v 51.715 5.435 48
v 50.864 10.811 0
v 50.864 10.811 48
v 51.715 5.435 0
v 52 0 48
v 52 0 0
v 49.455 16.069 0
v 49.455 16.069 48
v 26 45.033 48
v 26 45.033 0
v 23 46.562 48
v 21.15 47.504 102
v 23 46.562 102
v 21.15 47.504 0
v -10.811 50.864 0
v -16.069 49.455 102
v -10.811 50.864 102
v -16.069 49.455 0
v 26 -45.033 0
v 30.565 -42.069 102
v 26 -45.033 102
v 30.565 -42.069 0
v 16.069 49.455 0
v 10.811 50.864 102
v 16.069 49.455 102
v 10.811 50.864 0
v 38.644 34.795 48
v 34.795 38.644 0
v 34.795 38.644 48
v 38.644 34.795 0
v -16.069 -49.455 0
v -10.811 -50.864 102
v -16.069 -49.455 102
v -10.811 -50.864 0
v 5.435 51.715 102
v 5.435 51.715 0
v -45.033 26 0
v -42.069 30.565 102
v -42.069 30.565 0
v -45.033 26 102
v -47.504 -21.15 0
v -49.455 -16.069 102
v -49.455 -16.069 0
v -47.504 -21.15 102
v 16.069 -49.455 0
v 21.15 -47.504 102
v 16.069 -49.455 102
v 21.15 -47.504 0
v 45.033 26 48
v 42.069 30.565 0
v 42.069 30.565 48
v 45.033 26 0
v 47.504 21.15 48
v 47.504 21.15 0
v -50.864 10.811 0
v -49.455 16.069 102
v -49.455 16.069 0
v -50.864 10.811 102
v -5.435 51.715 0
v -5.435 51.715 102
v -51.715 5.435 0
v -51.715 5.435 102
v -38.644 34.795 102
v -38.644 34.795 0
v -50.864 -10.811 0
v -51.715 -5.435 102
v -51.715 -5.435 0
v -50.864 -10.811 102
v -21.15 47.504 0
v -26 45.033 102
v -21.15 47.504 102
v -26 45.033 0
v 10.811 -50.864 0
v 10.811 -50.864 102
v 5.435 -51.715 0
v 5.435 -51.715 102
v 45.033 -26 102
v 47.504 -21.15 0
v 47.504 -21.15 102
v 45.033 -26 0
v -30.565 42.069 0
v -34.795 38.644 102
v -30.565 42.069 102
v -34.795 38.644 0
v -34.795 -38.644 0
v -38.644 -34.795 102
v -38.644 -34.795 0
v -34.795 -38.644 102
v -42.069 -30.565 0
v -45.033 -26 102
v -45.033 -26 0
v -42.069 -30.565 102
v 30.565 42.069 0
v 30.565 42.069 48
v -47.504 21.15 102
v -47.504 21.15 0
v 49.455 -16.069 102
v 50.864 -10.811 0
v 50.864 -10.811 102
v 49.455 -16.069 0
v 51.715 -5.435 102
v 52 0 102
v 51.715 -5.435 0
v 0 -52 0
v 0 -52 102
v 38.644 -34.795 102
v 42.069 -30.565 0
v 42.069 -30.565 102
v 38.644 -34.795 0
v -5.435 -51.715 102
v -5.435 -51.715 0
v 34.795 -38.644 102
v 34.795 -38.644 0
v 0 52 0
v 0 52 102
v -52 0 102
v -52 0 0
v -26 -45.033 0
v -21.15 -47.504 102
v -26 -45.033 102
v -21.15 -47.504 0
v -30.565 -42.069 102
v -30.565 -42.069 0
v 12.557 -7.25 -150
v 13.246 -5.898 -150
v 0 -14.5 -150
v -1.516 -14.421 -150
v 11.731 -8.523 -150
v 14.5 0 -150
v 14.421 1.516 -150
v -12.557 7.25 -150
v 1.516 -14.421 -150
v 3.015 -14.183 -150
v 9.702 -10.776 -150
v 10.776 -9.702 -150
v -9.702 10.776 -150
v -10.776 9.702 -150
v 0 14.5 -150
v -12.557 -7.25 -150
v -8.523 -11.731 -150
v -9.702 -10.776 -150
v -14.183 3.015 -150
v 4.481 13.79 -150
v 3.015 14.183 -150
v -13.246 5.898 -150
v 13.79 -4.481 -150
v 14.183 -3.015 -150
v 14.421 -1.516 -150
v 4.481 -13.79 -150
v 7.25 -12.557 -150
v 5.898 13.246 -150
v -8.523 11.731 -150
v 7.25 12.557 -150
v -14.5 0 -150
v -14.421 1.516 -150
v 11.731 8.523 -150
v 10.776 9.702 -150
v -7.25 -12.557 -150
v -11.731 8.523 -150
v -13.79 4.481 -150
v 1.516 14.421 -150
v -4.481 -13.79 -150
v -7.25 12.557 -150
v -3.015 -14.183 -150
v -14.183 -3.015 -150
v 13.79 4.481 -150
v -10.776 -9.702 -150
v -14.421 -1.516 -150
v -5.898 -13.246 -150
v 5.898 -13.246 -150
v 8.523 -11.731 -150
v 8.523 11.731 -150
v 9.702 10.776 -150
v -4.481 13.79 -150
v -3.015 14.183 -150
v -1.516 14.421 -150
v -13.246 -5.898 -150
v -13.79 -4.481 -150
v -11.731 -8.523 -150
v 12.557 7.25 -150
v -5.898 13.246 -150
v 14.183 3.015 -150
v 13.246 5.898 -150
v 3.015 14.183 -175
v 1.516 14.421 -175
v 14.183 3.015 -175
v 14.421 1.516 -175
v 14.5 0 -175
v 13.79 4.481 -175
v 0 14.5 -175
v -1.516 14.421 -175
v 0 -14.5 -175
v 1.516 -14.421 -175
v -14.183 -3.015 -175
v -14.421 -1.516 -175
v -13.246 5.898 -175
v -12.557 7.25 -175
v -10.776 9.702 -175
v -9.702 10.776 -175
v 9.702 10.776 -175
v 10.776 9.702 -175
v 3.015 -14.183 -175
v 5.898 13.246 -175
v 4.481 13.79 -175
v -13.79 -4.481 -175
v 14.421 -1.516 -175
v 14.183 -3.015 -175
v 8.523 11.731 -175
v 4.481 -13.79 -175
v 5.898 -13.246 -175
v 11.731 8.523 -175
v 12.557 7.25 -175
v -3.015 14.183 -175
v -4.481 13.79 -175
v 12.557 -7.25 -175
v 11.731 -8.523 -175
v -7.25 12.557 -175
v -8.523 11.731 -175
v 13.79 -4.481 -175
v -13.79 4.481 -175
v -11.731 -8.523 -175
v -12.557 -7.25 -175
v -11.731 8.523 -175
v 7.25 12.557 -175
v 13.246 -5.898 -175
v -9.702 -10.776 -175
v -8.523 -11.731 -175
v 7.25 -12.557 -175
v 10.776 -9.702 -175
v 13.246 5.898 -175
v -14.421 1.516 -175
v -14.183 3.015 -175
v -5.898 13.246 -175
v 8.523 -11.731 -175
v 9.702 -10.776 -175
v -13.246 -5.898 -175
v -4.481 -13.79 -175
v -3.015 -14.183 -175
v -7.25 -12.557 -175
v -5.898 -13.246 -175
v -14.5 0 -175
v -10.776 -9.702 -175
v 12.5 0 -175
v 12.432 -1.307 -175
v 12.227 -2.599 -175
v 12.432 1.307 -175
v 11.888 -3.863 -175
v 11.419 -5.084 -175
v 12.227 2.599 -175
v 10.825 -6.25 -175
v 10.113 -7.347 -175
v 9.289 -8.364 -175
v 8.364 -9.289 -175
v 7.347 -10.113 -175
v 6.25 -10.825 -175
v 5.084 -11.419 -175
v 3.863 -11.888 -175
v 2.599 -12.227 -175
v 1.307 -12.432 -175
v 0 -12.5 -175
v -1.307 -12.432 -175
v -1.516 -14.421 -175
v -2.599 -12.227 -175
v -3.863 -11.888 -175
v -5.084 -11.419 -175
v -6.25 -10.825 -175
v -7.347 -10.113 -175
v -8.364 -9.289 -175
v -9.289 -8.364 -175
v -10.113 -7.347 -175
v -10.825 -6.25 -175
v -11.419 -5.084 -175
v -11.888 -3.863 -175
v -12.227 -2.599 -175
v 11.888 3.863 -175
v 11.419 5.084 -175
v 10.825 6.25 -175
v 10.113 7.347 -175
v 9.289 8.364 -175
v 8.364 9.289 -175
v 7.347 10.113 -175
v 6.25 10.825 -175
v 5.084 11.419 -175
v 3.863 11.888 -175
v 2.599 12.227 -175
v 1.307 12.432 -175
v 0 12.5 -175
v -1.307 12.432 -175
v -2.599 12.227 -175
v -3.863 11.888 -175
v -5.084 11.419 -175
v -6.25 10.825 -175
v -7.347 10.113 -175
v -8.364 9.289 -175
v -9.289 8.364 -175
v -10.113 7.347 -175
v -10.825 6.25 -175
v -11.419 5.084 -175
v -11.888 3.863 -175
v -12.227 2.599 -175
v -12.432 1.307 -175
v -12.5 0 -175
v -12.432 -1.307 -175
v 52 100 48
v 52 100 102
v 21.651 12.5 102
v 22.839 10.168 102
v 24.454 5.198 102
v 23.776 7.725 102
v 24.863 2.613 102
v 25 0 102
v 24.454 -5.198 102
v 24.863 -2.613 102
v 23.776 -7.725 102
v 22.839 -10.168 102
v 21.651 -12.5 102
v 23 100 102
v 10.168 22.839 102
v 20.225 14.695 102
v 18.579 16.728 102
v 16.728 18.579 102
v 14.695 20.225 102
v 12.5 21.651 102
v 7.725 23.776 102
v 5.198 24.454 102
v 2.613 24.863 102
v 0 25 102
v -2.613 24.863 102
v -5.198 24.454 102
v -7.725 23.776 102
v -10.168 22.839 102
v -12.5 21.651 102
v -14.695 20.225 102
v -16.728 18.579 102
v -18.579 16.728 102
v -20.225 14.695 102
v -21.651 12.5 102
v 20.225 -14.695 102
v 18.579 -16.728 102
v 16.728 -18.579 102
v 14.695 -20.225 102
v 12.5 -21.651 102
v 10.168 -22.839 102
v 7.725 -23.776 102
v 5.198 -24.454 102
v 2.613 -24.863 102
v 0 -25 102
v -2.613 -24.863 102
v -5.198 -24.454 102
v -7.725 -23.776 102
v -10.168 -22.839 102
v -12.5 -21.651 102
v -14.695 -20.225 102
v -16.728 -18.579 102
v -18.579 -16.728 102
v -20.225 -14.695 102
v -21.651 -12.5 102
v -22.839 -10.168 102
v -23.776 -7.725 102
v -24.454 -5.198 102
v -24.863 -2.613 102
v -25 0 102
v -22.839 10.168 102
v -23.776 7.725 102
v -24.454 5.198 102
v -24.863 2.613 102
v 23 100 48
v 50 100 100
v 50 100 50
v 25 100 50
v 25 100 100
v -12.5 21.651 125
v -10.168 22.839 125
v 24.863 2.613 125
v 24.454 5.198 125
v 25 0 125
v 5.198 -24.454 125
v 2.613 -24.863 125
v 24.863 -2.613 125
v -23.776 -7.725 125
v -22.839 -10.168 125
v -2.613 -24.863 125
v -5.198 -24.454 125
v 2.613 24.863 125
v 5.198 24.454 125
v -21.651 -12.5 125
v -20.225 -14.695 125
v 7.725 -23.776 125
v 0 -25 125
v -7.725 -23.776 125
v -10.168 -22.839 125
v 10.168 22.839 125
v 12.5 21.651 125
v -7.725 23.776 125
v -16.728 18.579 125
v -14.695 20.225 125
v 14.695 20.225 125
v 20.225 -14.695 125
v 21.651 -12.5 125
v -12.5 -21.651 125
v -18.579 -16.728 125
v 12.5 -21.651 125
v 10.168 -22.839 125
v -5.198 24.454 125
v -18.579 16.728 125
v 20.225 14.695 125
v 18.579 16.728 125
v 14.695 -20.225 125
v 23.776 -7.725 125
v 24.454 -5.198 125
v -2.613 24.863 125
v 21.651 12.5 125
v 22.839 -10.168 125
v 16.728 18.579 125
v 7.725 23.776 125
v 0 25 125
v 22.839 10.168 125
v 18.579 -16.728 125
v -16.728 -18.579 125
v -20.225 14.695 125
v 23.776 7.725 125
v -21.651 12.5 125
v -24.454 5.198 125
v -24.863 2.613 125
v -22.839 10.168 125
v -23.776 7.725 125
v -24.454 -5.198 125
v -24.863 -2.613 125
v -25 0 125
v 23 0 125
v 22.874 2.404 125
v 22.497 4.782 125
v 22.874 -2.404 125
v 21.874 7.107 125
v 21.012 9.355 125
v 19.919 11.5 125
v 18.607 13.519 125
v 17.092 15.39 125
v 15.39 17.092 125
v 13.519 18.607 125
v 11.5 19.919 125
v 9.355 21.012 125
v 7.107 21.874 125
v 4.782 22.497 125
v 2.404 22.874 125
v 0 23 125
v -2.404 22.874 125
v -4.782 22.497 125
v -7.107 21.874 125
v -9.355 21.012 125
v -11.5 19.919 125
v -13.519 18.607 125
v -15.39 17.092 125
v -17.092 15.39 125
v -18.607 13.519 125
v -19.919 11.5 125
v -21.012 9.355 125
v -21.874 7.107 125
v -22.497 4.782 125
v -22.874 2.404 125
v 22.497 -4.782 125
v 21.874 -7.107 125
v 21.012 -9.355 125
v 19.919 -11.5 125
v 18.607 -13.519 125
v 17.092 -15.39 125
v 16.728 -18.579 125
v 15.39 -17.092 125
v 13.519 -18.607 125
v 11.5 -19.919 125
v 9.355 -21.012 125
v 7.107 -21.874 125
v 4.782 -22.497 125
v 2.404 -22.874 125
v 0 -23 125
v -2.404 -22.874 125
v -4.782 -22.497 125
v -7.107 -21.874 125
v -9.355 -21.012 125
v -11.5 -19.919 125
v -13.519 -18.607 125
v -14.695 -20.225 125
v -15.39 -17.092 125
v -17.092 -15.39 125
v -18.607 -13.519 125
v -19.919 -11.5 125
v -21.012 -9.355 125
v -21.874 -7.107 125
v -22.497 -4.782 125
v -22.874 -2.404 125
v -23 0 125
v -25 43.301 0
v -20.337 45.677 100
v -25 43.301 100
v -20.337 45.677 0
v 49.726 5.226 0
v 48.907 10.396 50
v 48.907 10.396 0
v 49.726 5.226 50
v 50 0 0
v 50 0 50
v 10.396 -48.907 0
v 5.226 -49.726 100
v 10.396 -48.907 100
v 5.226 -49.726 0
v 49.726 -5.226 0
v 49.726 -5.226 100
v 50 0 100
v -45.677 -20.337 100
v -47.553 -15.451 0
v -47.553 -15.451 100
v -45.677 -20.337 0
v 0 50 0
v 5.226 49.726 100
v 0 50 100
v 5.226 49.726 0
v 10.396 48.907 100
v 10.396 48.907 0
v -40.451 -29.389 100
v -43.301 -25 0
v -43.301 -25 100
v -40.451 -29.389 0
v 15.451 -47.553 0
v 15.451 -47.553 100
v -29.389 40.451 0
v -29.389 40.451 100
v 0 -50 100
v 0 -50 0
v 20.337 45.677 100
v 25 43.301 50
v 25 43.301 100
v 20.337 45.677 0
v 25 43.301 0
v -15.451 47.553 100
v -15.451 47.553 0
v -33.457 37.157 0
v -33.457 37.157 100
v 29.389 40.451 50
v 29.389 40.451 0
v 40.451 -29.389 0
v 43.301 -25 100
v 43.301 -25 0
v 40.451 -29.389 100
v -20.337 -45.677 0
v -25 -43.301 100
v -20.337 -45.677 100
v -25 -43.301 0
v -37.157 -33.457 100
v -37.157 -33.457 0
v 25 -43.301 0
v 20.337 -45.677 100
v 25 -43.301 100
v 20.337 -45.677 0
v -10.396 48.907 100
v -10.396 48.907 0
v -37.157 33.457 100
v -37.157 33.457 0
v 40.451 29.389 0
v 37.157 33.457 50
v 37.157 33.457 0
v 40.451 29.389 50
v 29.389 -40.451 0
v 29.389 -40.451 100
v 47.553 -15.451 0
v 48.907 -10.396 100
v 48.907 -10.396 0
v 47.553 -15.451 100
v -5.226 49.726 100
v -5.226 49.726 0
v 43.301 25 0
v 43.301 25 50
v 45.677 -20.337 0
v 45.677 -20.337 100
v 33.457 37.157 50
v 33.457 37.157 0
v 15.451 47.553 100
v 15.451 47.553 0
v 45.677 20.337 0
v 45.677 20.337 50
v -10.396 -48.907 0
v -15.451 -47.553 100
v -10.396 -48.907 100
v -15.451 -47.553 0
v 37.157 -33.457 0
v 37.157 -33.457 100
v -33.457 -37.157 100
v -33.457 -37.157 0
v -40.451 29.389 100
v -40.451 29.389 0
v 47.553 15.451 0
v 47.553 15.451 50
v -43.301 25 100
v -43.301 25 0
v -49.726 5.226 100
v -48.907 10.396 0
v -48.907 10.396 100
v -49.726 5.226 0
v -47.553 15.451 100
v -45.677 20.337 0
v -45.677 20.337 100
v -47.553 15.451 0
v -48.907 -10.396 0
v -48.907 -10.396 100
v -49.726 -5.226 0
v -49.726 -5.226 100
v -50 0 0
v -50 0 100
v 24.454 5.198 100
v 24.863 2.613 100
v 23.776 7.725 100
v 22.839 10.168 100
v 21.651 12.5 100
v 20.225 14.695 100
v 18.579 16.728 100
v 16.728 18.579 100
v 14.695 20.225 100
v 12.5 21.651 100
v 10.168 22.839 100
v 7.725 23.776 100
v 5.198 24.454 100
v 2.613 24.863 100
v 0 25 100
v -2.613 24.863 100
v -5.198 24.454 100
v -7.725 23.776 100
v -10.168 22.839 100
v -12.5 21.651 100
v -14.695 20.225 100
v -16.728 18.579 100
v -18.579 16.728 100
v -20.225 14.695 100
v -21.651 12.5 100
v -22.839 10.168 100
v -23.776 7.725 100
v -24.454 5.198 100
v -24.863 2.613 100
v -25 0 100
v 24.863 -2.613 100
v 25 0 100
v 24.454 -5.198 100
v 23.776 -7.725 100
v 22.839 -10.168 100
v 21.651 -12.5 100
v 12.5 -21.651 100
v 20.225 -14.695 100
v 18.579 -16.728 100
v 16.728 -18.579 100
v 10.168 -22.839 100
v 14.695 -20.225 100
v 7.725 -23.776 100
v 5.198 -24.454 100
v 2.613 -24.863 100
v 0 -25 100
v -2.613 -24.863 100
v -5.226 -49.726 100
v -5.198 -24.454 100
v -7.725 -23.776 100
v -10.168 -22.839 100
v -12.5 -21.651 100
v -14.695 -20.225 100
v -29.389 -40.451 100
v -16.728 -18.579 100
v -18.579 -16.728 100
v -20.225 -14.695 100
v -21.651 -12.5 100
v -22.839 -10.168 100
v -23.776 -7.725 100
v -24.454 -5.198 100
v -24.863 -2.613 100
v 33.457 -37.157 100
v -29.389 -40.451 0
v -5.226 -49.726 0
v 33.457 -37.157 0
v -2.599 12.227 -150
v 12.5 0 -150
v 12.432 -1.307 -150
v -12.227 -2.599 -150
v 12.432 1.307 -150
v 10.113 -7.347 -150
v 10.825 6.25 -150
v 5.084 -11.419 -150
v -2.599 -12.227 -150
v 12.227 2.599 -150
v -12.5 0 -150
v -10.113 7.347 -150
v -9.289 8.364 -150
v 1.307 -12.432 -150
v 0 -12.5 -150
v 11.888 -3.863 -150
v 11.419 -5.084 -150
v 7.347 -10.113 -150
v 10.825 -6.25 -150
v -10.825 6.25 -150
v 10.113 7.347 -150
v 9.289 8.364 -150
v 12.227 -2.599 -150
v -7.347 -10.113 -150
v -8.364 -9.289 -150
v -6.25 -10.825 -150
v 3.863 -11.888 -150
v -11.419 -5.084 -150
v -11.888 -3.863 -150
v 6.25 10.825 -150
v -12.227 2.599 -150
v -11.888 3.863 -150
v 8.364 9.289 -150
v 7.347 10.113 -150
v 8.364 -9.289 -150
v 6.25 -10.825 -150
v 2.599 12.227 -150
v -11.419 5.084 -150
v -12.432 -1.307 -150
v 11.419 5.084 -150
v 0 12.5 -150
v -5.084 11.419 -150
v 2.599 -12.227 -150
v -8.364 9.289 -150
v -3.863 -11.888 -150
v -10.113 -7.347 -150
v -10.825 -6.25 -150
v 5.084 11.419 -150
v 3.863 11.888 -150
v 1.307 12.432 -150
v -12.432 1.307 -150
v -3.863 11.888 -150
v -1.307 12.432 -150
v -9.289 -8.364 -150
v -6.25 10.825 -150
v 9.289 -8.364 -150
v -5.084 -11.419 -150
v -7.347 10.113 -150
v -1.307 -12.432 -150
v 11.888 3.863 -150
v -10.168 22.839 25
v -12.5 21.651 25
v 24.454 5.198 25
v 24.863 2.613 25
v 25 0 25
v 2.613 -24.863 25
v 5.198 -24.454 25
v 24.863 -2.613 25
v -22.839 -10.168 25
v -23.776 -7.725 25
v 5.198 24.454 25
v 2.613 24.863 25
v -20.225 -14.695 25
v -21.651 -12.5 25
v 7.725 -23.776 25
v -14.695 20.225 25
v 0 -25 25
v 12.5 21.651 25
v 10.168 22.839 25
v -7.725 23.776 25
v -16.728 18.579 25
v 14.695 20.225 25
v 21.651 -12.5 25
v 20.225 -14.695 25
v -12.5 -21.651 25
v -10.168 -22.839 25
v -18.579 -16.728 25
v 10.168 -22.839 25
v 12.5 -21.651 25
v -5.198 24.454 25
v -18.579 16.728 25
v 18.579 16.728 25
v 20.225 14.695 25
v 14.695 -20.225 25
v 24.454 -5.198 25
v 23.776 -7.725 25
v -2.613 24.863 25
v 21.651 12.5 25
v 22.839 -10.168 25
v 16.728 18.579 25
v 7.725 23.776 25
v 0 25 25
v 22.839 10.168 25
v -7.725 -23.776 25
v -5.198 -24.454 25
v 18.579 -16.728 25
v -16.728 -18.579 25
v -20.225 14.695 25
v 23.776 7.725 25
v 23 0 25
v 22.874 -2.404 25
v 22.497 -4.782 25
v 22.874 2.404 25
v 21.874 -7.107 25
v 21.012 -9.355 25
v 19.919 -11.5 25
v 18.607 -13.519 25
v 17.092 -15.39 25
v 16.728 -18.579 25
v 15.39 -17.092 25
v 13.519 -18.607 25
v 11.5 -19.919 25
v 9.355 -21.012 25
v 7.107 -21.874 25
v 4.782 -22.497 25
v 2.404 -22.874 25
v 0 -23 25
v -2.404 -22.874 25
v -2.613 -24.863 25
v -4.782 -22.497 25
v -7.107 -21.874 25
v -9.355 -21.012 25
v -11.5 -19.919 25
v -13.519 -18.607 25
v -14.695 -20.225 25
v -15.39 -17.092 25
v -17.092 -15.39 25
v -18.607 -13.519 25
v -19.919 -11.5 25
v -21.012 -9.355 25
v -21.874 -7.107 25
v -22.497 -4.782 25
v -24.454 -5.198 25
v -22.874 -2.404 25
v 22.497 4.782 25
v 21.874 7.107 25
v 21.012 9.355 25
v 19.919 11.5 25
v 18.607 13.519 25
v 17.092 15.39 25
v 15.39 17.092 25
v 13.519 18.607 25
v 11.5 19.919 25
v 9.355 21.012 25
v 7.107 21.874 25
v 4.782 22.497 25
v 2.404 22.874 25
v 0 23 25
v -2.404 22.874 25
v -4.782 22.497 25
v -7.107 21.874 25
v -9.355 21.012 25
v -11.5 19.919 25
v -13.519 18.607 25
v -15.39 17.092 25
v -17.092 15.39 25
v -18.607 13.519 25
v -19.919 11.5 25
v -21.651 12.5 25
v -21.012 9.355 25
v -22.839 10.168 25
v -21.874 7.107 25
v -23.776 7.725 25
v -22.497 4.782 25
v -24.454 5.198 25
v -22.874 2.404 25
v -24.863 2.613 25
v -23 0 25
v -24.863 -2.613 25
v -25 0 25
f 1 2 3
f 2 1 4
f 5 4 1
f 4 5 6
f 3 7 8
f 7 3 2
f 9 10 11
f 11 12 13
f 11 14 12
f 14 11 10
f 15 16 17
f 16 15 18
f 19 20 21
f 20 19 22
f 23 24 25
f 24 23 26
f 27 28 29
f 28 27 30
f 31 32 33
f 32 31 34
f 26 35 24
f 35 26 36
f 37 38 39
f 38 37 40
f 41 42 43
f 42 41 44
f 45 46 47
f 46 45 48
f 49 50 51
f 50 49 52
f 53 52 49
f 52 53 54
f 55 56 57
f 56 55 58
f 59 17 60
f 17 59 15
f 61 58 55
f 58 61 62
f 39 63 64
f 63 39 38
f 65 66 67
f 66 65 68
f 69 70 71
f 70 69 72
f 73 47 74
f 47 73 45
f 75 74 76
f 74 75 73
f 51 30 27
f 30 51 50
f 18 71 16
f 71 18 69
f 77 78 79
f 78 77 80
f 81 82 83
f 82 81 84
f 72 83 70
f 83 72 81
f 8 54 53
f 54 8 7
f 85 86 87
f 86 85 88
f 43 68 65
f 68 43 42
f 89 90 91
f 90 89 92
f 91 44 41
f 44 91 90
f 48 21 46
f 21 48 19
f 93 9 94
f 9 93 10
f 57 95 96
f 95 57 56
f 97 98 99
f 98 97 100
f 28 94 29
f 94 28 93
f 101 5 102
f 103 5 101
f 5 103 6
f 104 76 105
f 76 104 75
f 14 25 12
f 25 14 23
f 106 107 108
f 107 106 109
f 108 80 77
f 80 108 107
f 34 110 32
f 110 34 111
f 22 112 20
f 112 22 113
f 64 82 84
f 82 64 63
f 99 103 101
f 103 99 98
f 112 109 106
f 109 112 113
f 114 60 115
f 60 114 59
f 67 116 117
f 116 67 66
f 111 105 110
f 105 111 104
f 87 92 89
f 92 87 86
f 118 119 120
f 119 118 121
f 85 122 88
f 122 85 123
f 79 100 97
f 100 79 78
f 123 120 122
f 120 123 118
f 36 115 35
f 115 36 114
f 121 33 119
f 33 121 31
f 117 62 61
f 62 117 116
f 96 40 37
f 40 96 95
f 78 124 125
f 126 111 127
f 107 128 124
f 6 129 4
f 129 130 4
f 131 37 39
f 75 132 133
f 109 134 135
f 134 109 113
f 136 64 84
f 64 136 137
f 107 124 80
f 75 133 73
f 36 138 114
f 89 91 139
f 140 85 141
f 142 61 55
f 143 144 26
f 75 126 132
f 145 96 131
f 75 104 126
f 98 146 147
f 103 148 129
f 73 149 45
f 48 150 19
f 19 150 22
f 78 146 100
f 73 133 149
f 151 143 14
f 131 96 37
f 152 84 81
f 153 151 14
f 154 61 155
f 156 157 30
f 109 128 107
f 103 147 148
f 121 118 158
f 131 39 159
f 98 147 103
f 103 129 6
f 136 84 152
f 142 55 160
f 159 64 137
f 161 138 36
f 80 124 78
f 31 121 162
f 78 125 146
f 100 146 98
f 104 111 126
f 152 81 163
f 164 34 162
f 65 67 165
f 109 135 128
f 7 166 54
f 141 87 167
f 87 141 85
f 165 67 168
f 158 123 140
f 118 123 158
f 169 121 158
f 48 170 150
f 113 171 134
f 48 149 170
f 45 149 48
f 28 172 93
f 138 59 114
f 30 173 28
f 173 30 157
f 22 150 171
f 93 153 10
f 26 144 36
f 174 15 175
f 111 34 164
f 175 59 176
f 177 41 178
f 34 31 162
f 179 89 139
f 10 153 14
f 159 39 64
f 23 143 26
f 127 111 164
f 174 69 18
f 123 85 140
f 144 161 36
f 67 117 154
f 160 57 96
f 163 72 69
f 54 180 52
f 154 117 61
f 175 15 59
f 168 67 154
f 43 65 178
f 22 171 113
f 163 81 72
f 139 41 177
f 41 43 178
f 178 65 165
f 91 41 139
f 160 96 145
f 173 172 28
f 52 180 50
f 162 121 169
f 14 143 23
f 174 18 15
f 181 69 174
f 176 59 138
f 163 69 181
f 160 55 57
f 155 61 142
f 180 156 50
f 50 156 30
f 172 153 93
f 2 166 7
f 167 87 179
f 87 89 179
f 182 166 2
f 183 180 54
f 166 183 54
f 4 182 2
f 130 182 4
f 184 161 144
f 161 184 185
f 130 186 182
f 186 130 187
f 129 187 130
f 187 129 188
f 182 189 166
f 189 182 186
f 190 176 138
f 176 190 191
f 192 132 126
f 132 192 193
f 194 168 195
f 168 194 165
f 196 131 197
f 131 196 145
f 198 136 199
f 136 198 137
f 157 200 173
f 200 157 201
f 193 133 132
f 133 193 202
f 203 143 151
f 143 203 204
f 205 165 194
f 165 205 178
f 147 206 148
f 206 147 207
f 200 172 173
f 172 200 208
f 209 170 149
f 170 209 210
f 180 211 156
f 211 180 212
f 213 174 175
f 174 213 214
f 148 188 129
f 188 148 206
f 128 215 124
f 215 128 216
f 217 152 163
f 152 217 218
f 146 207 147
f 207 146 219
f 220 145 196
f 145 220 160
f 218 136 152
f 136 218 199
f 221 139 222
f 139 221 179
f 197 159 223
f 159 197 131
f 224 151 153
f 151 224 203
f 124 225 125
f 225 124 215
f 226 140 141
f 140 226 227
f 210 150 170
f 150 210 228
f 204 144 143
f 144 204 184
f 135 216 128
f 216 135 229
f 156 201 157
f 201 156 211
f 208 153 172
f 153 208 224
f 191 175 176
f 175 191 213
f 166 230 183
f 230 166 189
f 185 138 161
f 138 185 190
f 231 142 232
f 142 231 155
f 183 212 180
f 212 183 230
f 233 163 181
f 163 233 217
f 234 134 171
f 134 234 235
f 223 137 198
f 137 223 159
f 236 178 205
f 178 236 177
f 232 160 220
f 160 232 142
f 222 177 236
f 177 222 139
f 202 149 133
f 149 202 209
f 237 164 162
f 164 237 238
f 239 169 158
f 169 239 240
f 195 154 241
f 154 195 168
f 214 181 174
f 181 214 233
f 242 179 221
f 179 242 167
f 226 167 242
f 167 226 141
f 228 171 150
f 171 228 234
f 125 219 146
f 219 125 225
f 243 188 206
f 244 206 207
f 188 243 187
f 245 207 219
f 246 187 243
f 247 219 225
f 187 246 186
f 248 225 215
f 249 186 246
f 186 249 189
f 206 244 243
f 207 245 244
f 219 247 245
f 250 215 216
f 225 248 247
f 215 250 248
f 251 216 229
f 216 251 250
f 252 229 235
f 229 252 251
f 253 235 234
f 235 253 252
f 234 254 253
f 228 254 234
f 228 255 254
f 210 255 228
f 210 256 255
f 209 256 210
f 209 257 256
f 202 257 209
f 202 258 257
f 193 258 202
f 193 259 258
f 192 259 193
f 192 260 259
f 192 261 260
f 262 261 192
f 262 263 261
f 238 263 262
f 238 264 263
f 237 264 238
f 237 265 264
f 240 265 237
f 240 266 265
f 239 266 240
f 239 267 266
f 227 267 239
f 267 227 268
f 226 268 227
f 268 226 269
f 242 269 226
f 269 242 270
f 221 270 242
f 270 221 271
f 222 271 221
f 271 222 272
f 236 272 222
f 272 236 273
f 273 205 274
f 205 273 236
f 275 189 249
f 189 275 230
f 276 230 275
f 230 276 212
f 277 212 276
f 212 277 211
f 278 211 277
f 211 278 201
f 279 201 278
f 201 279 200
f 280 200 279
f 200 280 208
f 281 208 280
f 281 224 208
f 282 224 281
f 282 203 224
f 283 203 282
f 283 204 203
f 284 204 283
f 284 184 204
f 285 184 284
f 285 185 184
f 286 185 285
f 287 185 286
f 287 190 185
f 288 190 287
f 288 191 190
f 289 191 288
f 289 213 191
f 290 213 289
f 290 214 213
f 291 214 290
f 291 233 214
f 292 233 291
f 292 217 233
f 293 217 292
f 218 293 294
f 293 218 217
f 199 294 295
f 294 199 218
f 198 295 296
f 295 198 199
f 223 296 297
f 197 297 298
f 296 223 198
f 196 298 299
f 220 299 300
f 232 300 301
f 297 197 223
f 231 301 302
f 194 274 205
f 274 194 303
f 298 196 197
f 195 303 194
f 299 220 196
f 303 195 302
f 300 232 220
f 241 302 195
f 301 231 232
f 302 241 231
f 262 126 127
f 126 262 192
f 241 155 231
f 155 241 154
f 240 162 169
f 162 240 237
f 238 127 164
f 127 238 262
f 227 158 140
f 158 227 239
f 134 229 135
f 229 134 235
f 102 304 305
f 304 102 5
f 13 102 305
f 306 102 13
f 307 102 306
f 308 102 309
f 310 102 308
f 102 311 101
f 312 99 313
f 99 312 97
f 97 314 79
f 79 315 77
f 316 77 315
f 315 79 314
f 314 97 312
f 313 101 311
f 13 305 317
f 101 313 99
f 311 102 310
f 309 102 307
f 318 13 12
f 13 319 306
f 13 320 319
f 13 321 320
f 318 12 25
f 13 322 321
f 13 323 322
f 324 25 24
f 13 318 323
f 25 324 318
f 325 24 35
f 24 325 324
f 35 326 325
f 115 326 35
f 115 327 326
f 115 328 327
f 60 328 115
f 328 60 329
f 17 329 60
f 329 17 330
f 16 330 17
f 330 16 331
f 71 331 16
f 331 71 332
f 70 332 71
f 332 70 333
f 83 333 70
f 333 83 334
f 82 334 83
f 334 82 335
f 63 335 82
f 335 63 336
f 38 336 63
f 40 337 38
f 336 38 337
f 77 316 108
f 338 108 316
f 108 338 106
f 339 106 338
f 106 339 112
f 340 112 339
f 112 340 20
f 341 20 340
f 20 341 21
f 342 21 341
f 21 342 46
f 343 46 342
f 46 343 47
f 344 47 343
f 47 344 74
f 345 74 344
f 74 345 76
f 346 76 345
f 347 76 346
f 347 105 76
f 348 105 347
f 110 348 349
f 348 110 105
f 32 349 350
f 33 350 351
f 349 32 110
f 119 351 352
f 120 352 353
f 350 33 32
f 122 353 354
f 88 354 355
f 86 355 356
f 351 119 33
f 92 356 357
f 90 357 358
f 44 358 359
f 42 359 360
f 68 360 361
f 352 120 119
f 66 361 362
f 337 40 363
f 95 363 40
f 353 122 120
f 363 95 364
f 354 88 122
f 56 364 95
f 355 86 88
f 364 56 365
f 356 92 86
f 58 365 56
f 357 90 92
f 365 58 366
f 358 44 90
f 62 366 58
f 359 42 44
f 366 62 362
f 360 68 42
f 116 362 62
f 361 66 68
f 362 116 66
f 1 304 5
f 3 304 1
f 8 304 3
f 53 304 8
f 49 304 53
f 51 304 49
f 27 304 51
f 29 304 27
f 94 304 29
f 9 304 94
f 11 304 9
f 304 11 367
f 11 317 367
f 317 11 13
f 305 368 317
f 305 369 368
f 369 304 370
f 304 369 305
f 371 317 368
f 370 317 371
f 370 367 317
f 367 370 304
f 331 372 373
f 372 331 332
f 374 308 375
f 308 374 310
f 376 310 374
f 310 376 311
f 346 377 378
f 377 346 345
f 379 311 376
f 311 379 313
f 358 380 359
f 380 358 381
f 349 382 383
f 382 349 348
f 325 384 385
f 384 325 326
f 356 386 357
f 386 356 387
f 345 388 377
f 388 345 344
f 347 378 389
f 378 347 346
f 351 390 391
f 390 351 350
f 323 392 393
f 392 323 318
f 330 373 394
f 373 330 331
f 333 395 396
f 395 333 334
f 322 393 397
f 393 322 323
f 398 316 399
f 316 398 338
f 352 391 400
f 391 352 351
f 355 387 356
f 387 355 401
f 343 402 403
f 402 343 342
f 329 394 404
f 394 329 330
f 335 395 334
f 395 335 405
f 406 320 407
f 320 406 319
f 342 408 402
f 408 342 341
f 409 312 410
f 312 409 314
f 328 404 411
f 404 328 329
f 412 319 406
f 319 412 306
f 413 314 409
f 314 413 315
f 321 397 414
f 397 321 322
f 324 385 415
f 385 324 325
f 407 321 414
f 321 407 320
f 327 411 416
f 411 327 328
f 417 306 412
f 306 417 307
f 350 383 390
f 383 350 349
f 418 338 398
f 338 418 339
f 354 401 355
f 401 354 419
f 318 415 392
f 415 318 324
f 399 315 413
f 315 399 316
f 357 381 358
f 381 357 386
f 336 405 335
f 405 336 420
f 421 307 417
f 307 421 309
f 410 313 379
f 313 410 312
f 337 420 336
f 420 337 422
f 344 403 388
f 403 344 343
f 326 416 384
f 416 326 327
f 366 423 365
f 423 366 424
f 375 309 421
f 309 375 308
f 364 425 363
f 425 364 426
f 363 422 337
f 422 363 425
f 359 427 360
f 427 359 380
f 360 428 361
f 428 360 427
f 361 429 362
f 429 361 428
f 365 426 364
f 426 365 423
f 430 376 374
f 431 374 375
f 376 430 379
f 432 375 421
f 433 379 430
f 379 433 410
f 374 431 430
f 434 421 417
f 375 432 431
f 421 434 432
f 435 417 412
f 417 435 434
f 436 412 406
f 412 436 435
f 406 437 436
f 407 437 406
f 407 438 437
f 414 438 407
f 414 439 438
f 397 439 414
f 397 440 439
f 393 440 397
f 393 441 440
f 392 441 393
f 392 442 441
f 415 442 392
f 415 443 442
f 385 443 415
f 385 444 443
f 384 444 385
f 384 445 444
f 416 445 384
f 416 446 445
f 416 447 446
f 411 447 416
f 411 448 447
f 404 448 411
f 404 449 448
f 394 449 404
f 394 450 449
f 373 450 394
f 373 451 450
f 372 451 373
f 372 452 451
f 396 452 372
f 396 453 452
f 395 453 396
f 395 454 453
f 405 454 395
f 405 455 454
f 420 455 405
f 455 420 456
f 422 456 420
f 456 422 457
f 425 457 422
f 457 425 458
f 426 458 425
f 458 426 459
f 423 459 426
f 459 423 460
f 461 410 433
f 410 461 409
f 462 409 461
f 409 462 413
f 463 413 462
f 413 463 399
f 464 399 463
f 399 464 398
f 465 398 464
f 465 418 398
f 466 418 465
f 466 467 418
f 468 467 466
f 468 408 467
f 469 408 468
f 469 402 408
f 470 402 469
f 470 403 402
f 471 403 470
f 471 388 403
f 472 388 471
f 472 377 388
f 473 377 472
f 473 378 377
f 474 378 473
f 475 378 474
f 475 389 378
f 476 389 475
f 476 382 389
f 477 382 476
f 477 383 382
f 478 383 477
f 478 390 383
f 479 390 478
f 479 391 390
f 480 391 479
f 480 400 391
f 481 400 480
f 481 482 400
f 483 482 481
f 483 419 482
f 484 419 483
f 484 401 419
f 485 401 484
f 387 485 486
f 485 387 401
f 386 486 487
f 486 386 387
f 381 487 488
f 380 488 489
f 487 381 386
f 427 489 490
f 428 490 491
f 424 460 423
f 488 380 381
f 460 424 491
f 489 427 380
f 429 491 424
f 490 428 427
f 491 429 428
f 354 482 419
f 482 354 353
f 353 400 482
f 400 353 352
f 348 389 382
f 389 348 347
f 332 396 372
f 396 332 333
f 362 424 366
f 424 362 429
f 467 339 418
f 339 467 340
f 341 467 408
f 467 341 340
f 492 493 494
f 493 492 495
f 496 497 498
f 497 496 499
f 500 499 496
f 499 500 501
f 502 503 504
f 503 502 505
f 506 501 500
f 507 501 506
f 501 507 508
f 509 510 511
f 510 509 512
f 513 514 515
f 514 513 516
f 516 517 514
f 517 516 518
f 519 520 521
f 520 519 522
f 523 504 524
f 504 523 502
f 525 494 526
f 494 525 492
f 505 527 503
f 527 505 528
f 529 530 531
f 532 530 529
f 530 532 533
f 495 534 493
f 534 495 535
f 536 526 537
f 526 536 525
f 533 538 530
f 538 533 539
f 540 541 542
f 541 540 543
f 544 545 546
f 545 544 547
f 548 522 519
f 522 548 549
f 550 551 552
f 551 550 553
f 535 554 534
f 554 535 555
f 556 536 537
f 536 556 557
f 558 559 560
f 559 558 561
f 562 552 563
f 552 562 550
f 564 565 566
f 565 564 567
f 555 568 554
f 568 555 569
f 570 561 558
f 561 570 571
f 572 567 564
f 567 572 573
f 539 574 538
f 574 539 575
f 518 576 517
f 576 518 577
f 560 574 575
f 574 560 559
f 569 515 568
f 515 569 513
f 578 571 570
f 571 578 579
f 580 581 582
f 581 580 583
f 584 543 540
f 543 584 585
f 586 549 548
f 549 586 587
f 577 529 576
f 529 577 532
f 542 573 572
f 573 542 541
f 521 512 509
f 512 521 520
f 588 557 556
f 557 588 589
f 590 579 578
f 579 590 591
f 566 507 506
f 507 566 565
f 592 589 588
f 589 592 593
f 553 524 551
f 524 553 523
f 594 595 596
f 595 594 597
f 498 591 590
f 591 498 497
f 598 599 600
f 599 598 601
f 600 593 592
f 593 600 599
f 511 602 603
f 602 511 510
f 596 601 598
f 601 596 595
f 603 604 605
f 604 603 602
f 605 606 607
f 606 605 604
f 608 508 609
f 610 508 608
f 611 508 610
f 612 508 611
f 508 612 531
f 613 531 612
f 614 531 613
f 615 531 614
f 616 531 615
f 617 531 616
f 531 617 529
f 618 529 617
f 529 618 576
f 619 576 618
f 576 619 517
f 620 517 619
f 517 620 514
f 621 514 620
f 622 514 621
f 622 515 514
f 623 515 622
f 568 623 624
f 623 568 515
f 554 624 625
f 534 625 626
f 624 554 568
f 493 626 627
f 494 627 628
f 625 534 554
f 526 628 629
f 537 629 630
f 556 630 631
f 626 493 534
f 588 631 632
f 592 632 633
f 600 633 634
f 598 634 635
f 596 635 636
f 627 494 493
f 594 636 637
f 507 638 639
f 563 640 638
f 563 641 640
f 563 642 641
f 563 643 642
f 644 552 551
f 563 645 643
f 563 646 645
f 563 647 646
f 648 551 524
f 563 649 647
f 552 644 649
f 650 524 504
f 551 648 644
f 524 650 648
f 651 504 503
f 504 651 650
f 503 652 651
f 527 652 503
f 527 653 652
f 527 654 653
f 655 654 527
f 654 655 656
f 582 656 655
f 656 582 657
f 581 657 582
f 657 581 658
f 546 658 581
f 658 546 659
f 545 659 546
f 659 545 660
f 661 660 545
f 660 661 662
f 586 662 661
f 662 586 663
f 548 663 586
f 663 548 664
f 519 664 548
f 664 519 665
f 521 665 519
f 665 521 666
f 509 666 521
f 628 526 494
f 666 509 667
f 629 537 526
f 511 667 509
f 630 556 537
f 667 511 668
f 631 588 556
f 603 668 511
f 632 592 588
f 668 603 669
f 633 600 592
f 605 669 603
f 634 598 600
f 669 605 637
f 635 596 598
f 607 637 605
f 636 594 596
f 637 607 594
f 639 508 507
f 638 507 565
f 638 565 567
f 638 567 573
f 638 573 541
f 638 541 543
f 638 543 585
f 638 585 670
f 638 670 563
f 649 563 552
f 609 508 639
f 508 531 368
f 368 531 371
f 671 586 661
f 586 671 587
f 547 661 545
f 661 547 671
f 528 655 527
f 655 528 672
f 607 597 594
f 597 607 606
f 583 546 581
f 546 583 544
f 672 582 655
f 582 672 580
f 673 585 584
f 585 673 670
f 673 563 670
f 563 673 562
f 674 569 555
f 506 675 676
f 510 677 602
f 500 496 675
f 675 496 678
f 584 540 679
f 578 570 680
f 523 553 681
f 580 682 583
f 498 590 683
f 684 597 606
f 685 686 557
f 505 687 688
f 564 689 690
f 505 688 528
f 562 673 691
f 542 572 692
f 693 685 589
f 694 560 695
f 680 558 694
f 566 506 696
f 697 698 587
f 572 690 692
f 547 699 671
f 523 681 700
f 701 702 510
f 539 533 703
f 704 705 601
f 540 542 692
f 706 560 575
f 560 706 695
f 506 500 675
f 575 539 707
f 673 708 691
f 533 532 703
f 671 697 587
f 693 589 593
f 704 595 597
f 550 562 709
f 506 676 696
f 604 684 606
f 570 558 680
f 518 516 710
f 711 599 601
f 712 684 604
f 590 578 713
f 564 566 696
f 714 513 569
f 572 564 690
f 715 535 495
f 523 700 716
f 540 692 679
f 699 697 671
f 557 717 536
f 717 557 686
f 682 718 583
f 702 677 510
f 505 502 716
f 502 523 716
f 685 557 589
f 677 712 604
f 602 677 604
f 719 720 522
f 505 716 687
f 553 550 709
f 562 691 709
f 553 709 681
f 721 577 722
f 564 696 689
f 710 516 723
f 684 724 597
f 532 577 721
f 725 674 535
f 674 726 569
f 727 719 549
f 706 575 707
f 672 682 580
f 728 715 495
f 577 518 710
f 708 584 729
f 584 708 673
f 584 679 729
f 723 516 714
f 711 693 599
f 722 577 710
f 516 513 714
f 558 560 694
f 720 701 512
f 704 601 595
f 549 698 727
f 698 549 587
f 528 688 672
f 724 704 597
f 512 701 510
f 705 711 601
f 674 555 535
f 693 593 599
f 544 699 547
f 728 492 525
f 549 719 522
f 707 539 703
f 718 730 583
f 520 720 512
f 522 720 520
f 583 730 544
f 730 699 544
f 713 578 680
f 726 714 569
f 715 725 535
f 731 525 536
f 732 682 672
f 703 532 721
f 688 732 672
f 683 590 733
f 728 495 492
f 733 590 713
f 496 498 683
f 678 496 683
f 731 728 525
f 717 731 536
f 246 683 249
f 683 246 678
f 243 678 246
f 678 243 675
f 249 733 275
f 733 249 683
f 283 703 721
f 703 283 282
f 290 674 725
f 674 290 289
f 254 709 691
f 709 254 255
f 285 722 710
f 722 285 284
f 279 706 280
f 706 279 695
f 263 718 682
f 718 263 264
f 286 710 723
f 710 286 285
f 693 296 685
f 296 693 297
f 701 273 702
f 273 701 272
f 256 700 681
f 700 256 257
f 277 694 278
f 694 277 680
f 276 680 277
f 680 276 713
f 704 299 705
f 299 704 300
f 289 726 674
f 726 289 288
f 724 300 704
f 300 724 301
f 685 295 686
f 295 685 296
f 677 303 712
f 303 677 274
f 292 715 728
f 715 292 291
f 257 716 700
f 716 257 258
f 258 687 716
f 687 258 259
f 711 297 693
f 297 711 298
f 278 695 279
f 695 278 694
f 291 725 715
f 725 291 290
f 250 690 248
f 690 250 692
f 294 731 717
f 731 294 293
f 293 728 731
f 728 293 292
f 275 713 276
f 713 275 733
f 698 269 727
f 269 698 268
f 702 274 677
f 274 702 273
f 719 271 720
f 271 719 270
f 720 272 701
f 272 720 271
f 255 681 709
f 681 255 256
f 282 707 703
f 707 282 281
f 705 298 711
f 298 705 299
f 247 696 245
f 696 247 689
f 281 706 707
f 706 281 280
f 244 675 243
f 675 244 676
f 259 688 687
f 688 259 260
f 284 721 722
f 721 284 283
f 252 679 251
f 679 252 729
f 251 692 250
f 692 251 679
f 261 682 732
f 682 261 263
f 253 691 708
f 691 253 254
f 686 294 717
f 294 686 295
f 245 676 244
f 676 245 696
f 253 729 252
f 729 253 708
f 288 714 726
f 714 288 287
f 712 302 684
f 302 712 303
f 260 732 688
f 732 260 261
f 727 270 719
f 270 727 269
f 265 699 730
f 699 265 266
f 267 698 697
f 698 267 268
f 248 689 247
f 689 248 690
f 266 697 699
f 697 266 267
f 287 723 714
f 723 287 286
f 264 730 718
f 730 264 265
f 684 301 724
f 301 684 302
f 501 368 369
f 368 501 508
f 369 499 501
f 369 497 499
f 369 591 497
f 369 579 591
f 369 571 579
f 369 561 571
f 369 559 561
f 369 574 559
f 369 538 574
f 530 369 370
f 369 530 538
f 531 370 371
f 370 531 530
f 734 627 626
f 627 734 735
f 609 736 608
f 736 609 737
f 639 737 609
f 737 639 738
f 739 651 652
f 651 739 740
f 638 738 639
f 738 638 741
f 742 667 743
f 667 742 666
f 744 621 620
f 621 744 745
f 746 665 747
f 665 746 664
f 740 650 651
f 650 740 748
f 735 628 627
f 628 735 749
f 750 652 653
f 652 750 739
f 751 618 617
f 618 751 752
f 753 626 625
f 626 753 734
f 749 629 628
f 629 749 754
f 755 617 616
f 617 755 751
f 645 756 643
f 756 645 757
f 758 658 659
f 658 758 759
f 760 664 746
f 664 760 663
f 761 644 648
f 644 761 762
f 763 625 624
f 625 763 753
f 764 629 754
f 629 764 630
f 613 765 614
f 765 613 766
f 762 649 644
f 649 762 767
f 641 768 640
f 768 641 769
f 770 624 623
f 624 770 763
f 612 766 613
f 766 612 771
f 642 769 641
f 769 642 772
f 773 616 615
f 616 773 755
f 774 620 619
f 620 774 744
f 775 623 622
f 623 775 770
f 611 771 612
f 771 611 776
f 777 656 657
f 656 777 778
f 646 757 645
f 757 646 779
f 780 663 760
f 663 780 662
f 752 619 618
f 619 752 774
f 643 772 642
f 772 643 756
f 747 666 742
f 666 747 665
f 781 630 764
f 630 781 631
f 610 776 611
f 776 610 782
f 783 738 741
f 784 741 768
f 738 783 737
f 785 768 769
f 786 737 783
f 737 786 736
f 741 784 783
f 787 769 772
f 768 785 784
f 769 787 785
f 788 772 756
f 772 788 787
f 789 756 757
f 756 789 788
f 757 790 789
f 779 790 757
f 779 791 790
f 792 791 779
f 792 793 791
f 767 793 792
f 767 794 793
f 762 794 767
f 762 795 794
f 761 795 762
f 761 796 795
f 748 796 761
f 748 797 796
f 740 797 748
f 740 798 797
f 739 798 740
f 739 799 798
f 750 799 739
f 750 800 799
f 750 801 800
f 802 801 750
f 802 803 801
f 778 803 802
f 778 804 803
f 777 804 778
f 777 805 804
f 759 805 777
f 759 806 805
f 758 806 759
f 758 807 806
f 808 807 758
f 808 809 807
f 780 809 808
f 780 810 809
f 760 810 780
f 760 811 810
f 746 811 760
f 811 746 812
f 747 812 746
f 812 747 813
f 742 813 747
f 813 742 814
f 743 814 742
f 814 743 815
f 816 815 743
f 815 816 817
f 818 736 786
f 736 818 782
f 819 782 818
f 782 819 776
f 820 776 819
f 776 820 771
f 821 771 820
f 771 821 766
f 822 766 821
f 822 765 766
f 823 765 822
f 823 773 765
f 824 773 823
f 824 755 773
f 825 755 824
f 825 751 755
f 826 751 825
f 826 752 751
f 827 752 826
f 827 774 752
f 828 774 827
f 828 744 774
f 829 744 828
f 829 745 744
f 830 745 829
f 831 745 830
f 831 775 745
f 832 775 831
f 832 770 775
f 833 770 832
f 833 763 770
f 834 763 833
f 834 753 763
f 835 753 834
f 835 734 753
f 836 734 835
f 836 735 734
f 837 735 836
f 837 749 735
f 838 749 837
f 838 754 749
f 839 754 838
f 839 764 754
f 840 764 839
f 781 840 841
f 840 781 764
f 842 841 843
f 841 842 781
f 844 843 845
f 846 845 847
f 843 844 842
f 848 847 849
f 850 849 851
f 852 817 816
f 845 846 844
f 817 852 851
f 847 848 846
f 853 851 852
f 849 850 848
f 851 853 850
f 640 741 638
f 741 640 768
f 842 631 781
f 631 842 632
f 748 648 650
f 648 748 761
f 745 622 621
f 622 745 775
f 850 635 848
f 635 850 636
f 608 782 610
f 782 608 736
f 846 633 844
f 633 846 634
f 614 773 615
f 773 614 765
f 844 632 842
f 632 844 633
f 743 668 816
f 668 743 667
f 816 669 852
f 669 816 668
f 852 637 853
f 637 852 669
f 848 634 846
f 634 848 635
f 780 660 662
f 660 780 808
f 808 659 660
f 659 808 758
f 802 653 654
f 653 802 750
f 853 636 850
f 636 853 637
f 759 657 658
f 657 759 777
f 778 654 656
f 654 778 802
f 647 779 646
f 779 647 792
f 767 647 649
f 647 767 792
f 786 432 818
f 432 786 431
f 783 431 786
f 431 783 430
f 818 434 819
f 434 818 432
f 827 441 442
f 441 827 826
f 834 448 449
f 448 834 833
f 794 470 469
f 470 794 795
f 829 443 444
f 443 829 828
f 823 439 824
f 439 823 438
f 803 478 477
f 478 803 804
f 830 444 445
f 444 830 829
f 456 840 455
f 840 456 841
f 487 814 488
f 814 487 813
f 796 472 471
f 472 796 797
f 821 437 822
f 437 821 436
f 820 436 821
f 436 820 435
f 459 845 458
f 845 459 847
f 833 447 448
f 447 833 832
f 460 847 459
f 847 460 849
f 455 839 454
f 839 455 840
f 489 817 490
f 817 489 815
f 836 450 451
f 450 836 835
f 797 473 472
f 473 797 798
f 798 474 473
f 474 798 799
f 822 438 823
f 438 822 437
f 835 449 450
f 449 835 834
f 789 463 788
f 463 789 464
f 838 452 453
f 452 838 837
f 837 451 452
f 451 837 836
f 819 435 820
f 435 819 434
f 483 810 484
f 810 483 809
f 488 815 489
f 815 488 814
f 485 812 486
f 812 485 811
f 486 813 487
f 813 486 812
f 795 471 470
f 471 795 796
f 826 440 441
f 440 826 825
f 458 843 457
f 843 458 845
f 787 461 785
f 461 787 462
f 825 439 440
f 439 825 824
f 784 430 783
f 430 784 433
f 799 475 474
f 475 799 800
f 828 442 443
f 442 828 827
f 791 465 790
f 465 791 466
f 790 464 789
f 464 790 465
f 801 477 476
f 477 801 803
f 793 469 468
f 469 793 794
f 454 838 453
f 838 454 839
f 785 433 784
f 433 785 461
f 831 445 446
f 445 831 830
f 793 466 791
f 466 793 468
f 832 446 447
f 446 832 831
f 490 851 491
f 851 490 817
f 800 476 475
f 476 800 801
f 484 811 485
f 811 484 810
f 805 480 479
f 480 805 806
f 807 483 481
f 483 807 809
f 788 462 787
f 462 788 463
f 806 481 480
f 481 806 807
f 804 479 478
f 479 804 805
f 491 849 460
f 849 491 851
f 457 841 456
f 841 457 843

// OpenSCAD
// =============================================================================
// --- Parametric Cyclone Filter ---
// =============================================================================
// OpenSCAD model for a traditional tangential cyclone separator.

// --- Parameters ---
// (Defaults; can be overridden via -D from command line)
cyclone_diameter = 100.0;
cylinder_height = 100.0;
cone_height = 150.0;
inlet_width = 25.0;
inlet_height = 50.0;
vortex_finder_diameter = 50.0;
vortex_finder_length = 75.0;
dust_outlet_diameter = 25.0;
wall_thickness = 2.0;

// High resolution for rendering
$fn = is_undef(high_res_fn) ? 60 : high_res_fn;

// Simulation flags
GENERATE_CFD_VOLUME = is_undef(GENERATE_CFD_VOLUME) ? false : GENERATE_CFD_VOLUME;
part_to_generate = is_undef(part_to_generate) ? "solid" : part_to_generate;
CUT_FOR_VISIBILITY = is_undef(CUT_FOR_VISIBILITY) ? false : CUT_FOR_VISIBILITY;

// --- Calculated Geometry ---
cyclone_radius = cyclone_diameter / 2;
vortex_finder_radius = vortex_finder_diameter / 2;
dust_outlet_radius = dust_outlet_diameter / 2;

// --- Anchor for snappyHexMesh ---
if (GENERATE_CFD_VOLUME) {
    // A point guaranteed to be inside the fluid volume (e.g. inside the main cylinder)
    echo(str("MESH_ANCHOR=[0, 0, ", cylinder_height / 2, "]"));
}

module TangentialInlet(solid = true) {
    // The inlet is tangential to the cylinder wall at the top
    translate([cyclone_radius - inlet_width/2, 0, cylinder_height - inlet_height/2]) {
        if (solid) {
             cube([inlet_width, cyclone_diameter + 10, inlet_height], center=true);
        } else {
             cube([inlet_width - 2*wall_thickness, cyclone_diameter + 10, inlet_height - 2*wall_thickness], center=true);
        }
    }
}

module CycloneFluidVolume() {
    union() {
        // Main cylinder
        cylinder(r=cyclone_radius, h=cylinder_height, center=false);

        // Cone
        translate([0, 0, -cone_height])
        cylinder(r1=dust_outlet_radius, r2=cyclone_radius, h=cone_height, center=false);

        // Dust outlet pipe
        translate([0, 0, -cone_height - 25])
        cylinder(r=dust_outlet_radius, h=25, center=false);

        // Tangential inlet fluid
        // Extend slightly to make sure it intersects
        translate([cyclone_radius - inlet_width/2, 0, cylinder_height - inlet_height/2]) {
             // We extend in Y to act as the inlet pipe
             translate([0, cyclone_radius, 0])
             cube([inlet_width, cyclone_diameter, inlet_height], center=true);
        }
    }
}

module VortexFinder(solid = true) {
    // The pipe going down the center
    translate([0, 0, cylinder_height - vortex_finder_length]) {
        if (solid) {
             cylinder(r=vortex_finder_radius, h=vortex_finder_length + 25, center=false);
        } else {
             // Extend slightly downwards to overlap with main fluid, ensuring explicit union
             translate([0, 0, -1])
             cylinder(r=vortex_finder_radius - wall_thickness, h=vortex_finder_length + 27, center=false); // Inner hole
        }
    }
}

module ActualFluidVolume() {
    union() {
        difference() {
            CycloneFluidVolume();
            // Subtract the vortex finder pipe that protrudes *into* the fluid
            VortexFinder(solid=true);
        }
        // Add the fluid inside the vortex finder which goes out the top
        VortexFinder(solid=false);
    }
}

module CycloneSolid() {
    difference() {
        // Outer shell
        union() {
            cylinder(r=cyclone_radius + wall_thickness, h=cylinder_height, center=false);

            translate([0, 0, -cone_height])
            cylinder(r1=dust_outlet_radius + wall_thickness, r2=cyclone_radius + wall_thickness, h=cone_height, center=false);

            translate([0, 0, -cone_height - 25])
            cylinder(r=dust_outlet_radius + wall_thickness, h=25, center=false);

            // Outer inlet pipe
            translate([cyclone_radius - inlet_width/2, cyclone_radius, cylinder_height - inlet_height/2])
            cube([inlet_width + 2*wall_thickness, cyclone_diameter, inlet_height + 2*wall_thickness], center=true);

            // Outer vortex finder
            VortexFinder(solid=true);

            // Top plate
            translate([0, 0, cylinder_height])
            cylinder(r=cyclone_radius + wall_thickness, h=wall_thickness, center=false);
        }

        // Subtract actual fluid volume
        ActualFluidVolume();
    }
}

module GeneratePart() {
    if (part_to_generate == "solid") {
        CycloneSolid();
    } else if (part_to_generate == "fluid_volume" || part_to_generate == "corkscrew_fluid") { // alias for compatibility
        ActualFluidVolume();
    } else if (part_to_generate == "inlet") {
        // A patch at the end of the inlet pipe
        translate([cyclone_radius - inlet_width/2, cyclone_diameter, cylinder_height - inlet_height/2])
        cube([inlet_width, 1, inlet_height], center=true);
    } else if (part_to_generate == "clean_outlet" || part_to_generate == "outlet") {
        // A patch at the top of the vortex finder
        translate([0, 0, cylinder_height + 25])
        cylinder(r=vortex_finder_radius - wall_thickness, h=1, center=true);
    } else if (part_to_generate == "dust_outlet") {
        // A patch at the bottom of the cone
        translate([0, 0, -cone_height - 25])
        cylinder(r=dust_outlet_radius, h=1, center=true);
    } else if (part_to_generate == "cfd_wall") {
        // The CFD wall is technically the fluid volume hull minus the inlet/outlets.
        // For snappyHexMesh, we often just provide the solid boundaries, but `corkscrewFilter`
        // workflow generates an explicit `wall.stl`.
        difference() {
             ActualFluidVolume();
             // Subtracting a bit of the caps so they aren't part of the wall
             // This is an approximation for STL generation; OpenFOAM topoSet handles exact boundaries usually
        }
    }
}

if (CUT_FOR_VISIBILITY) {
    difference() {
        GeneratePart();
        // Cut front half
        translate([-500, 0, -500]) cube([1000, 1000, 1000]);
    }
} else {
    GeneratePart();
}
